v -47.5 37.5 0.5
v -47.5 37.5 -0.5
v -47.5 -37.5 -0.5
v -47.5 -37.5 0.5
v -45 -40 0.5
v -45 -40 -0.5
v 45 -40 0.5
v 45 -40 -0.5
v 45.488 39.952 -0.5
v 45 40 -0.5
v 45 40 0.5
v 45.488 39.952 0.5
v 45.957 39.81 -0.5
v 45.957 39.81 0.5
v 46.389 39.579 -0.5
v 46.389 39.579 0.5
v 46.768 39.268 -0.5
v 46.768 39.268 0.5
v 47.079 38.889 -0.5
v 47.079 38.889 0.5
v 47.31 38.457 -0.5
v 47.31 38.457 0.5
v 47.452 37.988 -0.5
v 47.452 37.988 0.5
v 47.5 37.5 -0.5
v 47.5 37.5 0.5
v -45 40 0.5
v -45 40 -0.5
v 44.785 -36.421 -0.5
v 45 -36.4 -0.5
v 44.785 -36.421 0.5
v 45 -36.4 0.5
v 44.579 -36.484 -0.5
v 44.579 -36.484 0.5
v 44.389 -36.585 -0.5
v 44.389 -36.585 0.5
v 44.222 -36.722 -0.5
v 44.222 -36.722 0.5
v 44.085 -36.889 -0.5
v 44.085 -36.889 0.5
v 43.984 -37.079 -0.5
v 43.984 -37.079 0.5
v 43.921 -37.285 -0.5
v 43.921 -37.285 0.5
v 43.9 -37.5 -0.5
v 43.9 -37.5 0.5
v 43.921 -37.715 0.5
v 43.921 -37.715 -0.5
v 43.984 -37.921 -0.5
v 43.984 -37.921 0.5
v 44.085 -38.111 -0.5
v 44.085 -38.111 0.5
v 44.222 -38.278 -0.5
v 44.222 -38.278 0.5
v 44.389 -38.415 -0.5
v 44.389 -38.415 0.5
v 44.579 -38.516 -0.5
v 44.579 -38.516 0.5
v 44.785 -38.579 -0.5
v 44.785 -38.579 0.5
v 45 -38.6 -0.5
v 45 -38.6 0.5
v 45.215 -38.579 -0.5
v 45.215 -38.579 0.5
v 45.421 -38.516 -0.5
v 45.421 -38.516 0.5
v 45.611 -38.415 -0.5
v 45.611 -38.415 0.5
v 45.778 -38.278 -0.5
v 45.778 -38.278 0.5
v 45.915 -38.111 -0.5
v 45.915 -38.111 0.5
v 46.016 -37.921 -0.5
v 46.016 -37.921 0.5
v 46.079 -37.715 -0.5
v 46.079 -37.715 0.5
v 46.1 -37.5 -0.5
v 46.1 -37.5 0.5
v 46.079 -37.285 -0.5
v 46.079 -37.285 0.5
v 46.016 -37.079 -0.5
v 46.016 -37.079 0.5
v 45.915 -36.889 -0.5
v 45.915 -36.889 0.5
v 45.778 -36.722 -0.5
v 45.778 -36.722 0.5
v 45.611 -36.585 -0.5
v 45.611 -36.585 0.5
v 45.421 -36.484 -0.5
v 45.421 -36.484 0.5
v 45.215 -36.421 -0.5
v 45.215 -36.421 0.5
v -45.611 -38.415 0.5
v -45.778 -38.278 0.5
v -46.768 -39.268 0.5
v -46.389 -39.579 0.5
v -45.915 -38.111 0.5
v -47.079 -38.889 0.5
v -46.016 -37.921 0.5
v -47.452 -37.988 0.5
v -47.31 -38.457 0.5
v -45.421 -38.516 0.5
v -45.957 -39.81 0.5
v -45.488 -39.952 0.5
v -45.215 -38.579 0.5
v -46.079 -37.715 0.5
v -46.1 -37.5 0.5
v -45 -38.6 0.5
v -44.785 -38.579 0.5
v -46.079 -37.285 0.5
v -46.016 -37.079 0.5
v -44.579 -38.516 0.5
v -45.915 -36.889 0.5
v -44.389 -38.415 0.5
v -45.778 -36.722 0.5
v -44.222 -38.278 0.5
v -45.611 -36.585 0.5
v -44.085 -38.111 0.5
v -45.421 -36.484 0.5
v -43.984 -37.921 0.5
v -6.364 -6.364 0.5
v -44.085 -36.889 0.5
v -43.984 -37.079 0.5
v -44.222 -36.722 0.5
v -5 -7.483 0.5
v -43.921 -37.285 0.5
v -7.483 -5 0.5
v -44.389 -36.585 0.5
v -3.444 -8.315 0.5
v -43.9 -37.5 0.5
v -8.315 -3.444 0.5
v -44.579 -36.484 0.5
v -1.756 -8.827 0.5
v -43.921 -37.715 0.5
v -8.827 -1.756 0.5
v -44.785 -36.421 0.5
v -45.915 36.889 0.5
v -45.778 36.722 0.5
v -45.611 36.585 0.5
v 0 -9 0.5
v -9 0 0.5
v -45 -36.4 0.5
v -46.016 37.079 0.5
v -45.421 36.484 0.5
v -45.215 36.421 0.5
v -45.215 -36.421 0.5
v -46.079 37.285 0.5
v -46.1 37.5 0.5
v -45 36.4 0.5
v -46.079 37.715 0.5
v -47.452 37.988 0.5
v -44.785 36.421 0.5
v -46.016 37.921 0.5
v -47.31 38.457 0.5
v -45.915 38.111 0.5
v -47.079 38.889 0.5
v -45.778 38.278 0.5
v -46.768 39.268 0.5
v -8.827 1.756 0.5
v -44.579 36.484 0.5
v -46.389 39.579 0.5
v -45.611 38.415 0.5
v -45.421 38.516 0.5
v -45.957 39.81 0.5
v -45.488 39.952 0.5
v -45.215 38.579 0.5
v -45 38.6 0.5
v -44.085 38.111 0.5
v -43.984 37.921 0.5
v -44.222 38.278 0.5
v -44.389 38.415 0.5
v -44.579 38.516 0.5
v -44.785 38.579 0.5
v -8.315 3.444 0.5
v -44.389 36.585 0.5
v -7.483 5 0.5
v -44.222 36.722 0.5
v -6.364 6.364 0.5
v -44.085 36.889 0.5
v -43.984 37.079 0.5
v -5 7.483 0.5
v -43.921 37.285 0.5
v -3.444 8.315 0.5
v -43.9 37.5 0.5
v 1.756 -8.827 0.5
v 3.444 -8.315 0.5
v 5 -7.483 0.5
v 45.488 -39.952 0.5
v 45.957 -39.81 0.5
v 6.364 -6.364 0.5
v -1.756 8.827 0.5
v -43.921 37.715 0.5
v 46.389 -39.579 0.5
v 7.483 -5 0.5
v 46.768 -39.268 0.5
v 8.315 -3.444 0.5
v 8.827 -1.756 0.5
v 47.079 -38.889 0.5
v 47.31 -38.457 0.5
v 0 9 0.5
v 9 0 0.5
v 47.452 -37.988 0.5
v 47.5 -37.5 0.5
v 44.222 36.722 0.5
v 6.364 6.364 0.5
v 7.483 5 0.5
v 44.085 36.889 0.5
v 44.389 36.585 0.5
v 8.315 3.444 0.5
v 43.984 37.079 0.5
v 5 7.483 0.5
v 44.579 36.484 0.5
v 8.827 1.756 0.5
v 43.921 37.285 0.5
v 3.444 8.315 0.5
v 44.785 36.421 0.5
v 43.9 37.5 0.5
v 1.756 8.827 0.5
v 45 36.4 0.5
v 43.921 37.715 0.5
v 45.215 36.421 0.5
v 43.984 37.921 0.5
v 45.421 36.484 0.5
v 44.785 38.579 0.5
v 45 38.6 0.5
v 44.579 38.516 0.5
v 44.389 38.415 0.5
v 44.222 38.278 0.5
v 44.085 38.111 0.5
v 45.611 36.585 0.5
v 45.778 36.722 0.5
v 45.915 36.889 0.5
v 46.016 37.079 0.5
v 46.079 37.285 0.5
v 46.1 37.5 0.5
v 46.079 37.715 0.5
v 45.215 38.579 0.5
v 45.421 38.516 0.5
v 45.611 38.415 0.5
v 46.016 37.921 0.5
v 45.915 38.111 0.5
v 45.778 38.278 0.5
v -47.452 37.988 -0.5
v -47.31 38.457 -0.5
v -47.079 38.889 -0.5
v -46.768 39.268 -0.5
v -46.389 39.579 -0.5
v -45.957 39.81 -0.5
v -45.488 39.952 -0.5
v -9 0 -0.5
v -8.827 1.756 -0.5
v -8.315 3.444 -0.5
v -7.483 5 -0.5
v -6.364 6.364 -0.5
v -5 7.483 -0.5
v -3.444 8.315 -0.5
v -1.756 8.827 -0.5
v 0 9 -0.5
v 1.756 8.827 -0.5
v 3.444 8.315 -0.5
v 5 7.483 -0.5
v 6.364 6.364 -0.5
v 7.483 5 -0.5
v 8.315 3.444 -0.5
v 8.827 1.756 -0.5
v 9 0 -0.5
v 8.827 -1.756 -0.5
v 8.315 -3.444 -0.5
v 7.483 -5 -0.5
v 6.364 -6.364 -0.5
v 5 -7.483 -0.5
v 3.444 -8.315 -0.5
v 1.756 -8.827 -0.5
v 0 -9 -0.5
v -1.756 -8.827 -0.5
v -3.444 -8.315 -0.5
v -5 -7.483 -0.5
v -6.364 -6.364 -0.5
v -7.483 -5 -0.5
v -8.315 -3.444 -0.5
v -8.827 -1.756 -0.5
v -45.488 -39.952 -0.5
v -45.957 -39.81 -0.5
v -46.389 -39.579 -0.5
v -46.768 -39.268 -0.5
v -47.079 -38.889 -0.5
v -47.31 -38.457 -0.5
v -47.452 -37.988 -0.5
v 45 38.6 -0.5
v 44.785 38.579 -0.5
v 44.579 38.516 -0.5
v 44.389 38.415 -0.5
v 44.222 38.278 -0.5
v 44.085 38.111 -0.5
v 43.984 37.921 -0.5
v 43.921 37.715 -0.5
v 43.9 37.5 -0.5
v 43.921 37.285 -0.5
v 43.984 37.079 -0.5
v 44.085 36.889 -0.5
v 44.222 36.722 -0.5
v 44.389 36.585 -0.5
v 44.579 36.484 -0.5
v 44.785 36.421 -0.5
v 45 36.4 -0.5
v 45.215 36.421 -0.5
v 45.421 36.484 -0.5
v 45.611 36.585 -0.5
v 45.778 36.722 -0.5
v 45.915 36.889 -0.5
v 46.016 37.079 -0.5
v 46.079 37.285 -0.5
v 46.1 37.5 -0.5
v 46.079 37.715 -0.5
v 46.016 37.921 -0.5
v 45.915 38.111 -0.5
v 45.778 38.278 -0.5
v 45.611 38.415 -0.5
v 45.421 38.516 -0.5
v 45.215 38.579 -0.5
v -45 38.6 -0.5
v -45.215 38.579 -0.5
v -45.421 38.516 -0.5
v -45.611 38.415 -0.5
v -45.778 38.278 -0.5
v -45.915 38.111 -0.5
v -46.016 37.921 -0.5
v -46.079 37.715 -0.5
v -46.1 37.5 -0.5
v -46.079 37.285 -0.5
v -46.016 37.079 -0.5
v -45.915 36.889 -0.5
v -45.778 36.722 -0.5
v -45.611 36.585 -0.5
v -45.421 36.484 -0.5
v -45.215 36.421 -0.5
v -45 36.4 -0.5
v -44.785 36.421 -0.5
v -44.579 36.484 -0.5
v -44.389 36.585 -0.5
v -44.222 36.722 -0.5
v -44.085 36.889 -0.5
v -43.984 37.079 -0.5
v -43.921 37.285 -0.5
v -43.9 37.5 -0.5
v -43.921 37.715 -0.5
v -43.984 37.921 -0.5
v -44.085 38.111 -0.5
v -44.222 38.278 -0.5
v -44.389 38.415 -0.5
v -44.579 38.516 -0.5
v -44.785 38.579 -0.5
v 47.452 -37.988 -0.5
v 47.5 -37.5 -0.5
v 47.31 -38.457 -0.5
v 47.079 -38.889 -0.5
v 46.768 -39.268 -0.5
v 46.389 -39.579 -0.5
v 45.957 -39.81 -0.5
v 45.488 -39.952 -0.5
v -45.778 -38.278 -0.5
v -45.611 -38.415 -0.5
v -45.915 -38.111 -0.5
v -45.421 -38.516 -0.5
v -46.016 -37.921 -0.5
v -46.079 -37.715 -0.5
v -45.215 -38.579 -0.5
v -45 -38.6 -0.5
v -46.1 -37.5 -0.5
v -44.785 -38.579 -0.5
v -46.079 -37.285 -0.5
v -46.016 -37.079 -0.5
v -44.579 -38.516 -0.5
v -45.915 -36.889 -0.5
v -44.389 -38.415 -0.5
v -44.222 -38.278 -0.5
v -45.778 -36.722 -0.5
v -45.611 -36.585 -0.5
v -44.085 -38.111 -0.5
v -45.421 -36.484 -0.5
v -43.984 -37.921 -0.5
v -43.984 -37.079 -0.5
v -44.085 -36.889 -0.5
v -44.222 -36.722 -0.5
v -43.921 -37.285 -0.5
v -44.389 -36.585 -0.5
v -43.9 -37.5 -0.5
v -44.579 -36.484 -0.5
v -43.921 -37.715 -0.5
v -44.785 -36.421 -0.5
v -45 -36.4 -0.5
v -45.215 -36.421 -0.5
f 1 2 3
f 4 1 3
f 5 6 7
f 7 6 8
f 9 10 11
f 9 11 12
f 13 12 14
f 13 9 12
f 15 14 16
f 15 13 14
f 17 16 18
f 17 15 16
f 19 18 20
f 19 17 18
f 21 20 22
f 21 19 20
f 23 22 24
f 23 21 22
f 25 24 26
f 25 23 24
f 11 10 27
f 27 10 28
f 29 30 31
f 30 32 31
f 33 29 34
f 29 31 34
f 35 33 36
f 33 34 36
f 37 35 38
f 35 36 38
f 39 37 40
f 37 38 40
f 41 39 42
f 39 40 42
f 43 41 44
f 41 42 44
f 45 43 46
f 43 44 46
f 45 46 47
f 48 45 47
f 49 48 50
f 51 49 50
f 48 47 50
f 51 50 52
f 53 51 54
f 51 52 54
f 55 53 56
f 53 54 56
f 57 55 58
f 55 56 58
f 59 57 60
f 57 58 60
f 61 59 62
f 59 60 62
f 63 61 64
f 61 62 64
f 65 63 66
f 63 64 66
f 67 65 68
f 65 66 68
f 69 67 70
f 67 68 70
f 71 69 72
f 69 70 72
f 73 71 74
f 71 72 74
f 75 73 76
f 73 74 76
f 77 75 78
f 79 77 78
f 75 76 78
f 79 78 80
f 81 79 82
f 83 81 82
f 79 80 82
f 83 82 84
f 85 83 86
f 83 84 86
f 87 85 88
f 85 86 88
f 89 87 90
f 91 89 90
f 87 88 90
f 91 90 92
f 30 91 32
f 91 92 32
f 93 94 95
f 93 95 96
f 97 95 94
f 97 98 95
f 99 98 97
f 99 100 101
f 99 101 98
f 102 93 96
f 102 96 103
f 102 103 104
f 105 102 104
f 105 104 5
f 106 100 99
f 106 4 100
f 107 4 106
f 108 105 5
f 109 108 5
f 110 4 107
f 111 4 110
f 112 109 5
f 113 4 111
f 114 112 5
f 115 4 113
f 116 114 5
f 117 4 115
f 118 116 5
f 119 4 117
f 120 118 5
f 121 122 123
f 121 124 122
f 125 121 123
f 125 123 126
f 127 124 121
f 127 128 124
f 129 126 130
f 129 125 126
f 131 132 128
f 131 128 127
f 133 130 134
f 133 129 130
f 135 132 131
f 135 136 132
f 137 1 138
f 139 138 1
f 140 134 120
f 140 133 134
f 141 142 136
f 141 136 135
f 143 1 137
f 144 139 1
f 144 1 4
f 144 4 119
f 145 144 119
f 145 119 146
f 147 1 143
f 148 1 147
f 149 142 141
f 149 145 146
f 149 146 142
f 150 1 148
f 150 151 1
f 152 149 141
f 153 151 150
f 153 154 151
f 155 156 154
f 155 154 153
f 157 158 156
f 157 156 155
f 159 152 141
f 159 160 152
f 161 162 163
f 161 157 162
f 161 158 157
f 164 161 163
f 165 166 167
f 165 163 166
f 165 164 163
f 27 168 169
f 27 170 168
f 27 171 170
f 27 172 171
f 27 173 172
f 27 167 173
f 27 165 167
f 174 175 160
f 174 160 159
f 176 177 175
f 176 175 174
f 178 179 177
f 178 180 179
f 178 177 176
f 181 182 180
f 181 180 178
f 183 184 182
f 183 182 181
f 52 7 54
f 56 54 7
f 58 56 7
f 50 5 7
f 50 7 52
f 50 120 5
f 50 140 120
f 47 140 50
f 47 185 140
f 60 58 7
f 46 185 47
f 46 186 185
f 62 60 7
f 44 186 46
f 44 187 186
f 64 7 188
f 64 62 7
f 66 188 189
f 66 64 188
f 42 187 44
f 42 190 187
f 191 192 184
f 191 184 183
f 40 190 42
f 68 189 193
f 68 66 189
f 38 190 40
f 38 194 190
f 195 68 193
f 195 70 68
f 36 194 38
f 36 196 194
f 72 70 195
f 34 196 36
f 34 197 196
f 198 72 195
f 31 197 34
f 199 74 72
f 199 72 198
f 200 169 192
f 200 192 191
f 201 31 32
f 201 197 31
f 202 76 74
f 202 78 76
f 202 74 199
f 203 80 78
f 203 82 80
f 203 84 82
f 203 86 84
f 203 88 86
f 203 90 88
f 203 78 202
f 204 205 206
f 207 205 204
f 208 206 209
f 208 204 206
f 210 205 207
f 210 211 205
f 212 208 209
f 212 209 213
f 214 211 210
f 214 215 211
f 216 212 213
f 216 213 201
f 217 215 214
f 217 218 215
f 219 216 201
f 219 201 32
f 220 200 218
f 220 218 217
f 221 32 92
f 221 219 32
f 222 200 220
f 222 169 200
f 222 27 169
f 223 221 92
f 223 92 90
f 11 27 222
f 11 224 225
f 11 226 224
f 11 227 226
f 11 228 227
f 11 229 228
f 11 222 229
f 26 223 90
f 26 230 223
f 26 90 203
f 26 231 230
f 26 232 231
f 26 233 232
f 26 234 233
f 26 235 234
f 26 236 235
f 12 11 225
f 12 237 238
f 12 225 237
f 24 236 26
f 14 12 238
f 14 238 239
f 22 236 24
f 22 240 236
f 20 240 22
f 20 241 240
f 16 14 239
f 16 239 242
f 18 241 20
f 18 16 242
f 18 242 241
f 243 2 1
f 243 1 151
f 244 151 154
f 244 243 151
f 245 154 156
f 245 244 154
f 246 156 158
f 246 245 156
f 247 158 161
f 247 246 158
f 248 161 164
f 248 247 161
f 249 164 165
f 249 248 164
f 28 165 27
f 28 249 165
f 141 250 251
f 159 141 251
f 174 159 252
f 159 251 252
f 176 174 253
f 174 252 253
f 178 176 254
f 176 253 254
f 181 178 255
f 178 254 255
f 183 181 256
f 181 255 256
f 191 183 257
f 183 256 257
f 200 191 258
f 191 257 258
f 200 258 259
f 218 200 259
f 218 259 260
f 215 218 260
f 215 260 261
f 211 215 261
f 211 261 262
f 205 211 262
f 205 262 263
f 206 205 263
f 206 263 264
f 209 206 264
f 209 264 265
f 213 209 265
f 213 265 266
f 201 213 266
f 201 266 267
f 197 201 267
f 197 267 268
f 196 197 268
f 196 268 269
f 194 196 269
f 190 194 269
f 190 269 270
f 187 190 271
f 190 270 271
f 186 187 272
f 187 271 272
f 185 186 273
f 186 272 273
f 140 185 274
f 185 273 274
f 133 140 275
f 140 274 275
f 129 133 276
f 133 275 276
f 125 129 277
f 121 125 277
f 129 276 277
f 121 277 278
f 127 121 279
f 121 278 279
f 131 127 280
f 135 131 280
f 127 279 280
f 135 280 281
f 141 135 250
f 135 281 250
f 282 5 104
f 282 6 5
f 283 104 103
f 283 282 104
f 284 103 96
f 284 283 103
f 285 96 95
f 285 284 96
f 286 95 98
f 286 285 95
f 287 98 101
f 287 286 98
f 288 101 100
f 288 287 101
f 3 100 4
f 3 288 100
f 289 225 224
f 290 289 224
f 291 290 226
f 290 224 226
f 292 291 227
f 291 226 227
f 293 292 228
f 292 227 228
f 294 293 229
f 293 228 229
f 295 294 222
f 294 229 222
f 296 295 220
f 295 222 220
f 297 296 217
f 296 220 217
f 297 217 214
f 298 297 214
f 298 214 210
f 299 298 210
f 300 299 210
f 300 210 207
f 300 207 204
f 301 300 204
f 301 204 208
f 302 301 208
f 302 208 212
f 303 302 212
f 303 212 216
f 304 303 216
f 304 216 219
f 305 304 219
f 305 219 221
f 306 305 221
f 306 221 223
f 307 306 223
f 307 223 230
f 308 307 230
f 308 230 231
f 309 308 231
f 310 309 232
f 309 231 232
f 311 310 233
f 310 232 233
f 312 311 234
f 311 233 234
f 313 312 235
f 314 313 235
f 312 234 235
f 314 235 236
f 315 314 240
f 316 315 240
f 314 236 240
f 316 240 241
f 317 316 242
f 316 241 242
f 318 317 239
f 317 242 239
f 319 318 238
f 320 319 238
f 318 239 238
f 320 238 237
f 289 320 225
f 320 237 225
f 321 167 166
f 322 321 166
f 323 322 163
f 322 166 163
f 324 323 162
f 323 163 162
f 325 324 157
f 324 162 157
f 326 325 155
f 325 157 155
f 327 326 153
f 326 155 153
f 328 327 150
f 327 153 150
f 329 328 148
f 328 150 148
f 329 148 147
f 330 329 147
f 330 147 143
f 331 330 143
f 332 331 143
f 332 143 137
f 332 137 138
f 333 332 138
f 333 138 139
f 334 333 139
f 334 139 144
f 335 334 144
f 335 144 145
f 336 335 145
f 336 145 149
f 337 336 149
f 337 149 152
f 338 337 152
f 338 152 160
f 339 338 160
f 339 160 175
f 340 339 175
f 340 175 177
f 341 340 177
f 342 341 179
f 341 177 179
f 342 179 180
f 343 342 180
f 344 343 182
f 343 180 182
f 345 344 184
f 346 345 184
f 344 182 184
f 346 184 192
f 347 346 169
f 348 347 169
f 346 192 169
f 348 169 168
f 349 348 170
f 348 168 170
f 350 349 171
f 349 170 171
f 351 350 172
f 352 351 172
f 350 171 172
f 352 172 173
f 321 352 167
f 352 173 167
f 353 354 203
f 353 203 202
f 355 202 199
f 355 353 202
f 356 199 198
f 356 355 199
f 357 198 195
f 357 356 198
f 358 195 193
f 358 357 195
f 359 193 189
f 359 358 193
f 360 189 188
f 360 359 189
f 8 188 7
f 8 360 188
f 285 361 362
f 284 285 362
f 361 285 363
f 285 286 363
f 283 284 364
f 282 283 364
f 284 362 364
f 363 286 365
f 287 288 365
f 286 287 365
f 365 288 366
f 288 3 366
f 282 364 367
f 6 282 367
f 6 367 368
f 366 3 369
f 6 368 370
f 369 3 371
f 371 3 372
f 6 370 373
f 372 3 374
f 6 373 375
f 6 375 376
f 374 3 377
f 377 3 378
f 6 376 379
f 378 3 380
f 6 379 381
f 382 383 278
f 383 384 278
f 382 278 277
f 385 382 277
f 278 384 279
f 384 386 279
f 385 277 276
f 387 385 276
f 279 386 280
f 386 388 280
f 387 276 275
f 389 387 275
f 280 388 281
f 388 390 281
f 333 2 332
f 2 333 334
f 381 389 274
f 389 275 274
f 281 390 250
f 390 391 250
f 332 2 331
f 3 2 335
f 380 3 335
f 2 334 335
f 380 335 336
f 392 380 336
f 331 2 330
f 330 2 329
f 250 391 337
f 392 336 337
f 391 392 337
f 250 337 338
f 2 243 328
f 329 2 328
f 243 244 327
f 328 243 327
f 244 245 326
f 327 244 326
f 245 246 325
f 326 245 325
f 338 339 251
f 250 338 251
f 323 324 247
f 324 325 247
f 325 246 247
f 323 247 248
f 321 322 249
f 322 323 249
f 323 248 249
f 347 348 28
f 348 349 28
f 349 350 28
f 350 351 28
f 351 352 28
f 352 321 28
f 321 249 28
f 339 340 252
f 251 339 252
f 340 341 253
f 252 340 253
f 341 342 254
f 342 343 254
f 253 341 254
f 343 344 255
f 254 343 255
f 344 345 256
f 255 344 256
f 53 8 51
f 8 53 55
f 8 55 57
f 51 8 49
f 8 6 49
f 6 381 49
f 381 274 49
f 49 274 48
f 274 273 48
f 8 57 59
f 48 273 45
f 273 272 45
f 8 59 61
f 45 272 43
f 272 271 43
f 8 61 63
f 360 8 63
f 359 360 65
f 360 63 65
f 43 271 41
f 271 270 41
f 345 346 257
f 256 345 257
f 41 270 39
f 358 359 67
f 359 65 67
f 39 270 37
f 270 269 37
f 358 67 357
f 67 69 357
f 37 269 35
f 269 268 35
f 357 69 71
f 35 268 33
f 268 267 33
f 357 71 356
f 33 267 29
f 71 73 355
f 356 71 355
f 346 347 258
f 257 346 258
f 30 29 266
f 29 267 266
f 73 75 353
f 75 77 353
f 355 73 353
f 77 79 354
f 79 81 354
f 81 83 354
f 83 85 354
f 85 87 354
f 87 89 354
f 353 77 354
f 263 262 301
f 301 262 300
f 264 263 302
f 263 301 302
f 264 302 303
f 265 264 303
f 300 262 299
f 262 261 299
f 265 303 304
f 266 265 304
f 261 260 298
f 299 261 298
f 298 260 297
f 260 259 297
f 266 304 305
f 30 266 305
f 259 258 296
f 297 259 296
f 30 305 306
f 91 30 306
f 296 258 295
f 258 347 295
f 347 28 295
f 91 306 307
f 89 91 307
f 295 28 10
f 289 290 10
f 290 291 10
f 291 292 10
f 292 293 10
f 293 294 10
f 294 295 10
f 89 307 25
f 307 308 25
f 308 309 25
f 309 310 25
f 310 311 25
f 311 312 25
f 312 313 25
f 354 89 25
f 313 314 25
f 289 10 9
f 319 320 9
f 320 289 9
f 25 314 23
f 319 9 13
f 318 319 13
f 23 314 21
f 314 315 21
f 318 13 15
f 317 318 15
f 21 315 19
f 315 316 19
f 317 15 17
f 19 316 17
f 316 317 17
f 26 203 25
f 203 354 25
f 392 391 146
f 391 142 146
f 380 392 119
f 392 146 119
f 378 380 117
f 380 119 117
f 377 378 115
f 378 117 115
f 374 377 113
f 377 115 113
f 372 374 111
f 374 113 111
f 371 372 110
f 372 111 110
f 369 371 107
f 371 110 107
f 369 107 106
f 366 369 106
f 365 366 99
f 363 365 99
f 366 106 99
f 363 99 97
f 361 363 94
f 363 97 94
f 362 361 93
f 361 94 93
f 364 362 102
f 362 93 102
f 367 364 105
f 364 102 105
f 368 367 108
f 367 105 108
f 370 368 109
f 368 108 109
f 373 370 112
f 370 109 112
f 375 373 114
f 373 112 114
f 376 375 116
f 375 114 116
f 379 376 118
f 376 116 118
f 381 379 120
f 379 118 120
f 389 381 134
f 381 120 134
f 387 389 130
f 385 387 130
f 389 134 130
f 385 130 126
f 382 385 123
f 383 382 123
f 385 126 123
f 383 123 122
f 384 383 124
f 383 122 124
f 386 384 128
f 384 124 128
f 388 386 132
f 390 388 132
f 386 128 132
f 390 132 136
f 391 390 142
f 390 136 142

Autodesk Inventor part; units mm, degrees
ref_plane "YZ Plane" through (0, 0, 0) normal (1, 0, 0) x (0, 1, 0)
ref_plane "XZ Plane" through (0, 0, 0) normal (0, 1, 0) x (-1, 0, 0)
ref_plane "XY Plane" through (0, 0, 0) normal (0, 0, 1) x (1, 0, 0)
sketch "Sketch1" plane through (0, 0, 0) normal (0, 0, 1) x (1, 0, 0)
  line L0 (-45, -40) -> (45, -40)
  line L1 (47.5, -37.5) -> (47.5, 37.5)
  line L2 (45, 40) -> (-45, 40)
  line L3 (-47.5, 37.5) -> (-47.5, -37.5)
  line L4 (-47.5, -40) -> (47.5, 40) construction
  line L5 (47.5, -40) -> (-47.5, 40) construction
  arc A0 (-45, 40) -> (-47.5, 37.5) centre (-45, 37.5) ccw
  arc A1 (47.5, 37.5) -> (45, 40) centre (45, 37.5) ccw
  arc A2 (45, -40) -> (47.5, -37.5) centre (45, -37.5) ccw
  arc A3 (-47.5, -37.5) -> (-45, -40) centre (-45, -37.5) ccw
  point P0 (0, 0)
  dimension "d0" = 95
  dimension "d1" = 80
  dimension "d2" = 2.5
extrude "Extrusion1" add sketch "Sketch1" along normal mid plane 1
sketch "Sketch2" plane through (0, 0, -0.5) normal (0, 0, -1) x (-1, 0, 0)
  circle A0 centre (0, 0) radius 9
  dimension "d5" = 18
extrude "Extrusion2" cut sketch "Sketch2" against normal through all
sketch "Sketch3" plane through (0, 0, -0.5) normal (0, 0, -1) x (-1, 0, 0)
  circle A0 centre (0, 0) radius 9 projected
  line L0 (47.5, -37.5) -> (47.5, 37.5) projected
  arc A1 (47.5, 37.5) -> (45, 40) centre (45, 37.5) ccw projected
  line L1 (45, 40) -> (-45, 40) projected
  arc A2 (-45, 40) -> (-47.5, 37.5) centre (-45, 37.5) ccw projected
  line L2 (-47.5, 37.5) -> (-47.5, -37.5) projected
  arc A3 (-47.5, -37.5) -> (-45, -40) centre (-45, -37.5) ccw projected
  line L3 (-45, -40) -> (45, -40) projected
  arc A4 (45, -40) -> (47.5, -37.5) centre (45, -37.5) ccw projected
hole "Hole1" at (-45, -37.5, -0.5) at (45, -37.5, -0.5) at (45, 37.5, -0.5) at (-45, 37.5, -0.5) direction (0, 0, 1) diameter 2.2 end through all clearance for "Flat Head Machine Screw" size "M2" standard "Ansi Metric M Profile"
properties part number "Structure_-ZCover" material "Aluminum 6061"
